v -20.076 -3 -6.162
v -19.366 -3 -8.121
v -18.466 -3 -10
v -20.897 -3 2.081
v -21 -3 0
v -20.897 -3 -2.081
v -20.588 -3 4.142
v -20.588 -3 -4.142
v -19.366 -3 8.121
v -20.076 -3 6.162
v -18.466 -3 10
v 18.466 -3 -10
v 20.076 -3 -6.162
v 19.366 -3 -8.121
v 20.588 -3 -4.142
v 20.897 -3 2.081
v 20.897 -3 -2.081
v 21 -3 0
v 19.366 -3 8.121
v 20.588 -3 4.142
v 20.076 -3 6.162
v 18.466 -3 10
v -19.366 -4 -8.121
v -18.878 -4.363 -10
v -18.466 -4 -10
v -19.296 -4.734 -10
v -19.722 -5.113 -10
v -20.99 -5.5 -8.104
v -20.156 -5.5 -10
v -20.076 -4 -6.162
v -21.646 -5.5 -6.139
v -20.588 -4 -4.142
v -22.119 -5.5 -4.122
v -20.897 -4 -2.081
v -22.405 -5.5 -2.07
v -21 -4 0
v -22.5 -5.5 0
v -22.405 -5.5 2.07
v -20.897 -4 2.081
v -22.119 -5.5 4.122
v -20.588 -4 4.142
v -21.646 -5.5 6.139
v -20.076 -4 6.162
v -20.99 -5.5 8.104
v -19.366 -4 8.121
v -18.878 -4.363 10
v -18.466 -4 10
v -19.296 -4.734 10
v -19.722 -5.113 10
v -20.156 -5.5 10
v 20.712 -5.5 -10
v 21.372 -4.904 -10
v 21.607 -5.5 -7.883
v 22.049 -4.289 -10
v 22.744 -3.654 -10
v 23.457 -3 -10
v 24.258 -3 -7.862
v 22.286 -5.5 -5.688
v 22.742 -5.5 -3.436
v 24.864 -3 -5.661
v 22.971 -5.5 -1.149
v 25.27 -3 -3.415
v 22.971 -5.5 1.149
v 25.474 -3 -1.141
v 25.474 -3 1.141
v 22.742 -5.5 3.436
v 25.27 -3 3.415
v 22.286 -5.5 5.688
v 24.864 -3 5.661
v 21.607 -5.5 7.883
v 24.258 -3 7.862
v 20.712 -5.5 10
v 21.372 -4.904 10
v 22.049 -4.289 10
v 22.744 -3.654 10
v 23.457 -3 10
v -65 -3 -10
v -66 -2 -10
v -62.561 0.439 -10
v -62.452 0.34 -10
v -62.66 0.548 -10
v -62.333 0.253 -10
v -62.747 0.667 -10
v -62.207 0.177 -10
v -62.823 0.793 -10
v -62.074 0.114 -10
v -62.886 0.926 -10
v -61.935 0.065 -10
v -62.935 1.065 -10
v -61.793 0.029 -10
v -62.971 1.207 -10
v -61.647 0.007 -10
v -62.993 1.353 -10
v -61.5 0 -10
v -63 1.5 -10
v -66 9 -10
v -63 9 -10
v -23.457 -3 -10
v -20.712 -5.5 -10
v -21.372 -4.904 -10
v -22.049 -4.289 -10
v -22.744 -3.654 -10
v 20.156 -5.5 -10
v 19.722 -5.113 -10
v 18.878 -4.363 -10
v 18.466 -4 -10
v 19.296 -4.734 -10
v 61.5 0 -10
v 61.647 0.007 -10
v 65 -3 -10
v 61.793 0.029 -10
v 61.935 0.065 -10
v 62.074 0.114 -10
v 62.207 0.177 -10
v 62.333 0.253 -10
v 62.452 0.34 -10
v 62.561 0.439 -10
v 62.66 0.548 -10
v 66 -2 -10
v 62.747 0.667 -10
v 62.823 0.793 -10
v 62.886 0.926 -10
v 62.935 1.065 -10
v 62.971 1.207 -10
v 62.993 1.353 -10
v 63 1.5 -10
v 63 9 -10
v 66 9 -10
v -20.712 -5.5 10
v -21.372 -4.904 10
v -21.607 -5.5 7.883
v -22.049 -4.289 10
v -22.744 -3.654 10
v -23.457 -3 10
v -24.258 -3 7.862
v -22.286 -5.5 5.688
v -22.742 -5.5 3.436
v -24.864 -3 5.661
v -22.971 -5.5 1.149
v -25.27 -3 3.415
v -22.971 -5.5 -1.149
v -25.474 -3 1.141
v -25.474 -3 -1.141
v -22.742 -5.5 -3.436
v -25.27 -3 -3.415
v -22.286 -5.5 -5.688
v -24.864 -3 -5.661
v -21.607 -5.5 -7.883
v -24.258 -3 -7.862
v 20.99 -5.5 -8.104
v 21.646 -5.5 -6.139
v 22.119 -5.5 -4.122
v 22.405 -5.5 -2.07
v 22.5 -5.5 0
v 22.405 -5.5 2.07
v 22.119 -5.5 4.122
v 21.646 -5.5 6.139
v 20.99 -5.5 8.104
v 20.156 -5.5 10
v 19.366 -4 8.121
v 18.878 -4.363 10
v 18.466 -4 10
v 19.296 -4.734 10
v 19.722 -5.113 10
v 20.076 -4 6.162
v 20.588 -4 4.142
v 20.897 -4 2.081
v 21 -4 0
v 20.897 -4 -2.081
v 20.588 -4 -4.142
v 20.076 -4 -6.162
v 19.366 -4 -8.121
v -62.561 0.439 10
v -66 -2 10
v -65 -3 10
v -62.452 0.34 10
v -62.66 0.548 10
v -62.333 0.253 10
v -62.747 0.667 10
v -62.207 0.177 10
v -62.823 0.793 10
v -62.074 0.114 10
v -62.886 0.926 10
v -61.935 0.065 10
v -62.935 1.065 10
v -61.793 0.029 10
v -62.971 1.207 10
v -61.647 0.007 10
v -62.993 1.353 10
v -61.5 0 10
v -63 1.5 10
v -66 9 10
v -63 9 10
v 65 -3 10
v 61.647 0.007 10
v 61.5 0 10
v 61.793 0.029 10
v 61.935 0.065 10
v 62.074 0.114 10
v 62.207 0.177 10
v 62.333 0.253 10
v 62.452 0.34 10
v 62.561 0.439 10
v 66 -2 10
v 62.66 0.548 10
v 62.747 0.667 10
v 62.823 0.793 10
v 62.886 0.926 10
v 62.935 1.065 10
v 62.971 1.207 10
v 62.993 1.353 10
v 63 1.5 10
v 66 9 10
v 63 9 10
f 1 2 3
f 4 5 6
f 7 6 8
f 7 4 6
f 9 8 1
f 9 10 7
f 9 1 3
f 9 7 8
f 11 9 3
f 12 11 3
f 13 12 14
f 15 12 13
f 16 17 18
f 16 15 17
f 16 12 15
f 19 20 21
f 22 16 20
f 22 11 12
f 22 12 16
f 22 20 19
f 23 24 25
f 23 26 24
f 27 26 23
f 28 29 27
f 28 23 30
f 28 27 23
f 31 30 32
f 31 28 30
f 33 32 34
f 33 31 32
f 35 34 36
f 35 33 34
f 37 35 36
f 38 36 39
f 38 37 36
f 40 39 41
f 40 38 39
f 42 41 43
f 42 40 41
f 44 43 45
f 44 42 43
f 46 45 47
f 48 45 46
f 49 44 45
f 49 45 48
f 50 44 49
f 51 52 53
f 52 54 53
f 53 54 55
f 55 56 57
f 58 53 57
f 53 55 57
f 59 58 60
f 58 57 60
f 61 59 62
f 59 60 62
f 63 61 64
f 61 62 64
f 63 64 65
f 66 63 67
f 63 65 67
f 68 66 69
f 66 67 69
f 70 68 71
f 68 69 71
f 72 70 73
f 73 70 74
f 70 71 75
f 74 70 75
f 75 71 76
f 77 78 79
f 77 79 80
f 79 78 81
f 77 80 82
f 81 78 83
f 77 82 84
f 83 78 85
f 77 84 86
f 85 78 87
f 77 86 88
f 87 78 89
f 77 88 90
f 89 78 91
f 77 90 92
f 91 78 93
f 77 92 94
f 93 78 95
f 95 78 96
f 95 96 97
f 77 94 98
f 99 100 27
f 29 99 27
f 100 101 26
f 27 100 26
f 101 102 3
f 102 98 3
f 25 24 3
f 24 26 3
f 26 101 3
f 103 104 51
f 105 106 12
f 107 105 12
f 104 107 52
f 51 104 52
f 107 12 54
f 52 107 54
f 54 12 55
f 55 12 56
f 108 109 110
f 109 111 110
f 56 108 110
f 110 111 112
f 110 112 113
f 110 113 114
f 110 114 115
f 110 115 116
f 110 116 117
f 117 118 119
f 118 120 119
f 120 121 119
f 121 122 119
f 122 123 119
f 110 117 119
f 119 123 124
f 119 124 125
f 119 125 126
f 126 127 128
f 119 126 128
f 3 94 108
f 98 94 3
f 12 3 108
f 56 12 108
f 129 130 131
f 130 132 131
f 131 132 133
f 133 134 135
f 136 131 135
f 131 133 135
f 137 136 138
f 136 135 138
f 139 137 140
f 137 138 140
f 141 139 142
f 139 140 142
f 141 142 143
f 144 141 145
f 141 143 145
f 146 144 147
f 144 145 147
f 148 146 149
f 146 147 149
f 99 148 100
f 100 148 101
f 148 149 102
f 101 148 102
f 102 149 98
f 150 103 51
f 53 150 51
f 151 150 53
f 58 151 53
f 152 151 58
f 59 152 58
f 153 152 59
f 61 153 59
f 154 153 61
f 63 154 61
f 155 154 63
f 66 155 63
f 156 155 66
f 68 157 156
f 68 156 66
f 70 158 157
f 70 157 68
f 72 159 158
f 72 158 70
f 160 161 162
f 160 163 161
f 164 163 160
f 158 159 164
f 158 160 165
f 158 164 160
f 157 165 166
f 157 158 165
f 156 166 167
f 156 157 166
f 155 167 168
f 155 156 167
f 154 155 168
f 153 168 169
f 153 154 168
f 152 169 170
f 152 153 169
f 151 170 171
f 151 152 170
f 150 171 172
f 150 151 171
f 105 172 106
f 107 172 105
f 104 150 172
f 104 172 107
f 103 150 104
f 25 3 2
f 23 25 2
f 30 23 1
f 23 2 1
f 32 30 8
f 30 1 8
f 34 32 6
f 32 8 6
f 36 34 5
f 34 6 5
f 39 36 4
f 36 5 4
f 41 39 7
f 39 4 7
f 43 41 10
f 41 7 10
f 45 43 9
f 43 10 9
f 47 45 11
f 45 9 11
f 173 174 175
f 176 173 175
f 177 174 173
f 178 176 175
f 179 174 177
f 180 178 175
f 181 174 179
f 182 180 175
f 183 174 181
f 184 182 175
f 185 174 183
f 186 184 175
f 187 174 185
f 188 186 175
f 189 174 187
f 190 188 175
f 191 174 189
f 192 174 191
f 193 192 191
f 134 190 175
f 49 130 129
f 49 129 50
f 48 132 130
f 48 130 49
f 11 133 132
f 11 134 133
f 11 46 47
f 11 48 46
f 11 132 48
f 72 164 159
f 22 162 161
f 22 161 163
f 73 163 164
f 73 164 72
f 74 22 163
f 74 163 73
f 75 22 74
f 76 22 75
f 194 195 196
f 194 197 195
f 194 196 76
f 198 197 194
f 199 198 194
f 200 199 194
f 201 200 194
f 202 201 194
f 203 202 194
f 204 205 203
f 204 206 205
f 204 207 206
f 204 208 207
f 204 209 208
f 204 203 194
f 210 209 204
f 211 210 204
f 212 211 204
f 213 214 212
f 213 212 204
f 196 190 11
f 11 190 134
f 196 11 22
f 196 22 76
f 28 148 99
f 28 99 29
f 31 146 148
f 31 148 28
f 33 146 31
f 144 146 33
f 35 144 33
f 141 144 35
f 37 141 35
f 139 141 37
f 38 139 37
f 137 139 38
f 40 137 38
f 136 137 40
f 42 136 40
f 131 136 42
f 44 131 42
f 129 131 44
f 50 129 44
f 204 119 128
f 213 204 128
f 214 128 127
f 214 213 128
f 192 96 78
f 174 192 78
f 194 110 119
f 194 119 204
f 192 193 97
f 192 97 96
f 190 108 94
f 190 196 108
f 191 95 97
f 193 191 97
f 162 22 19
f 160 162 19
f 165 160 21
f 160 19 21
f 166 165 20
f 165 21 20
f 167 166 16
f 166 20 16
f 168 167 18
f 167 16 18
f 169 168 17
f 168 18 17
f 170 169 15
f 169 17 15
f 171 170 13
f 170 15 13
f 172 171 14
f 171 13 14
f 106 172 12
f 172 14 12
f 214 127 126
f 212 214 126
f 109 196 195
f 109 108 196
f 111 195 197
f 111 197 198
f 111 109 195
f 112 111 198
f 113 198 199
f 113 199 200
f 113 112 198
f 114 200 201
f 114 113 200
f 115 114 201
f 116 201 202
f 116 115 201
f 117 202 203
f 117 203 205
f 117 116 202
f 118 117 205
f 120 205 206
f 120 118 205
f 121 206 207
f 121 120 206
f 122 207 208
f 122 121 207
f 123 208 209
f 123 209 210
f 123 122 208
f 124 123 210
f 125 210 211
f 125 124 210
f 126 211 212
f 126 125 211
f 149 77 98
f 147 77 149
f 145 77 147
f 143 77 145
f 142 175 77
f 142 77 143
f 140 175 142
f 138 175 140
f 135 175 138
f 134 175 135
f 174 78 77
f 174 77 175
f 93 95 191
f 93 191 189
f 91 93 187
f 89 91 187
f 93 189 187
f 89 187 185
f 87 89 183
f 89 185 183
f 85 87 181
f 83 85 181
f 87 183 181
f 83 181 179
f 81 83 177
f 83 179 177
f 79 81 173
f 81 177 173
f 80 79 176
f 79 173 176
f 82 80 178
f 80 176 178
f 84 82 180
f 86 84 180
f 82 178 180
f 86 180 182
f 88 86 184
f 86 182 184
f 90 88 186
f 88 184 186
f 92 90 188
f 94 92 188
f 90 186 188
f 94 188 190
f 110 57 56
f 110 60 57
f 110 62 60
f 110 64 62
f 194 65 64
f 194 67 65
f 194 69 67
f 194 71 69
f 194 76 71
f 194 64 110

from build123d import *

# Parameters (mm, degrees)
F1_DEPTH = 10
F3_DEPTH = 2.5
F4_SIZE  = 1.5
F5_SIZE  = 2.49999
F6_SIZE  = 1
F7_R     = 1.5


# Not quite as in the source:
# - a fillet or chamfer is up to 0.001 mm smaller than in the source, because OpenCascade refuses the exact size


with BuildPart() as f1:
    # F0 (on Top) → F1 (new body, symmetric)
    with BuildSketch(Plane.XY):
        Polygon((63, 0), (-63, 0), (-63, 9), (-66, 9), (-66, -3), (66, -3), (66, 9), (63, 9), align=None)
    extrude(amount=F1_DEPTH, both=True)

    # F2 (on face) → F3 (join)
    with BuildSketch(Plane.XZ.offset(3)):
        with BuildLine():
            ThreePointArc((-18.4661853126, -10), (-21, 0), (-18.4661853126, 10))
            Line((-18.4661853126, 10), (-20.7123151772, 10))
            ThreePointArc((-20.7123151772, 10), (-23, 0), (-20.7123151772, -10))
            Line((-20.7123151772, -10), (-18.4661853126, -10))
        make_face()
        with BuildLine():
            Line((20.7123151772, 10), (18.4661853126, 10))
            ThreePointArc((18.4661853126, 10), (21, 0), (18.4661853126, -10))
            Line((18.4661853126, -10), (20.7123151772, -10))
            ThreePointArc((20.7123151772, -10), (23, 0), (20.7123151772, 10))
        make_face()
    extrude(amount=F3_DEPTH)

    # F4
    f4_edges = [f1.edges().sort_by_distance(p)[0] for p in [
        (-21, -5.5, 0),
        (21, -5.5, 0),
    ]]
    chamfer(f4_edges, length=F4_SIZE)

    # F5 (size 2.5 in the source; OpenCascade refuses exactly that, so slightly less here)
    f5_edges = [f1.edges().sort_by_distance(p)[0] for p in [
        (-23, -3, 0),
        (23, -3, 0),
    ]]
    chamfer(f5_edges, length=F5_SIZE)

    # F6
    f6_edges = [f1.edges().sort_by_distance(p)[0] for p in [
        (-66, -3, 0),
        (66, -3, 0),
    ]]
    chamfer(f6_edges, length=F6_SIZE)

    # F7
    f7_edges = [f1.edges().sort_by_distance(p)[0] for p in [
        (63, 0, 0),
        (-63, 0, 0),
    ]]
    fillet(f7_edges, radius=F7_R)


solid = f1.part
